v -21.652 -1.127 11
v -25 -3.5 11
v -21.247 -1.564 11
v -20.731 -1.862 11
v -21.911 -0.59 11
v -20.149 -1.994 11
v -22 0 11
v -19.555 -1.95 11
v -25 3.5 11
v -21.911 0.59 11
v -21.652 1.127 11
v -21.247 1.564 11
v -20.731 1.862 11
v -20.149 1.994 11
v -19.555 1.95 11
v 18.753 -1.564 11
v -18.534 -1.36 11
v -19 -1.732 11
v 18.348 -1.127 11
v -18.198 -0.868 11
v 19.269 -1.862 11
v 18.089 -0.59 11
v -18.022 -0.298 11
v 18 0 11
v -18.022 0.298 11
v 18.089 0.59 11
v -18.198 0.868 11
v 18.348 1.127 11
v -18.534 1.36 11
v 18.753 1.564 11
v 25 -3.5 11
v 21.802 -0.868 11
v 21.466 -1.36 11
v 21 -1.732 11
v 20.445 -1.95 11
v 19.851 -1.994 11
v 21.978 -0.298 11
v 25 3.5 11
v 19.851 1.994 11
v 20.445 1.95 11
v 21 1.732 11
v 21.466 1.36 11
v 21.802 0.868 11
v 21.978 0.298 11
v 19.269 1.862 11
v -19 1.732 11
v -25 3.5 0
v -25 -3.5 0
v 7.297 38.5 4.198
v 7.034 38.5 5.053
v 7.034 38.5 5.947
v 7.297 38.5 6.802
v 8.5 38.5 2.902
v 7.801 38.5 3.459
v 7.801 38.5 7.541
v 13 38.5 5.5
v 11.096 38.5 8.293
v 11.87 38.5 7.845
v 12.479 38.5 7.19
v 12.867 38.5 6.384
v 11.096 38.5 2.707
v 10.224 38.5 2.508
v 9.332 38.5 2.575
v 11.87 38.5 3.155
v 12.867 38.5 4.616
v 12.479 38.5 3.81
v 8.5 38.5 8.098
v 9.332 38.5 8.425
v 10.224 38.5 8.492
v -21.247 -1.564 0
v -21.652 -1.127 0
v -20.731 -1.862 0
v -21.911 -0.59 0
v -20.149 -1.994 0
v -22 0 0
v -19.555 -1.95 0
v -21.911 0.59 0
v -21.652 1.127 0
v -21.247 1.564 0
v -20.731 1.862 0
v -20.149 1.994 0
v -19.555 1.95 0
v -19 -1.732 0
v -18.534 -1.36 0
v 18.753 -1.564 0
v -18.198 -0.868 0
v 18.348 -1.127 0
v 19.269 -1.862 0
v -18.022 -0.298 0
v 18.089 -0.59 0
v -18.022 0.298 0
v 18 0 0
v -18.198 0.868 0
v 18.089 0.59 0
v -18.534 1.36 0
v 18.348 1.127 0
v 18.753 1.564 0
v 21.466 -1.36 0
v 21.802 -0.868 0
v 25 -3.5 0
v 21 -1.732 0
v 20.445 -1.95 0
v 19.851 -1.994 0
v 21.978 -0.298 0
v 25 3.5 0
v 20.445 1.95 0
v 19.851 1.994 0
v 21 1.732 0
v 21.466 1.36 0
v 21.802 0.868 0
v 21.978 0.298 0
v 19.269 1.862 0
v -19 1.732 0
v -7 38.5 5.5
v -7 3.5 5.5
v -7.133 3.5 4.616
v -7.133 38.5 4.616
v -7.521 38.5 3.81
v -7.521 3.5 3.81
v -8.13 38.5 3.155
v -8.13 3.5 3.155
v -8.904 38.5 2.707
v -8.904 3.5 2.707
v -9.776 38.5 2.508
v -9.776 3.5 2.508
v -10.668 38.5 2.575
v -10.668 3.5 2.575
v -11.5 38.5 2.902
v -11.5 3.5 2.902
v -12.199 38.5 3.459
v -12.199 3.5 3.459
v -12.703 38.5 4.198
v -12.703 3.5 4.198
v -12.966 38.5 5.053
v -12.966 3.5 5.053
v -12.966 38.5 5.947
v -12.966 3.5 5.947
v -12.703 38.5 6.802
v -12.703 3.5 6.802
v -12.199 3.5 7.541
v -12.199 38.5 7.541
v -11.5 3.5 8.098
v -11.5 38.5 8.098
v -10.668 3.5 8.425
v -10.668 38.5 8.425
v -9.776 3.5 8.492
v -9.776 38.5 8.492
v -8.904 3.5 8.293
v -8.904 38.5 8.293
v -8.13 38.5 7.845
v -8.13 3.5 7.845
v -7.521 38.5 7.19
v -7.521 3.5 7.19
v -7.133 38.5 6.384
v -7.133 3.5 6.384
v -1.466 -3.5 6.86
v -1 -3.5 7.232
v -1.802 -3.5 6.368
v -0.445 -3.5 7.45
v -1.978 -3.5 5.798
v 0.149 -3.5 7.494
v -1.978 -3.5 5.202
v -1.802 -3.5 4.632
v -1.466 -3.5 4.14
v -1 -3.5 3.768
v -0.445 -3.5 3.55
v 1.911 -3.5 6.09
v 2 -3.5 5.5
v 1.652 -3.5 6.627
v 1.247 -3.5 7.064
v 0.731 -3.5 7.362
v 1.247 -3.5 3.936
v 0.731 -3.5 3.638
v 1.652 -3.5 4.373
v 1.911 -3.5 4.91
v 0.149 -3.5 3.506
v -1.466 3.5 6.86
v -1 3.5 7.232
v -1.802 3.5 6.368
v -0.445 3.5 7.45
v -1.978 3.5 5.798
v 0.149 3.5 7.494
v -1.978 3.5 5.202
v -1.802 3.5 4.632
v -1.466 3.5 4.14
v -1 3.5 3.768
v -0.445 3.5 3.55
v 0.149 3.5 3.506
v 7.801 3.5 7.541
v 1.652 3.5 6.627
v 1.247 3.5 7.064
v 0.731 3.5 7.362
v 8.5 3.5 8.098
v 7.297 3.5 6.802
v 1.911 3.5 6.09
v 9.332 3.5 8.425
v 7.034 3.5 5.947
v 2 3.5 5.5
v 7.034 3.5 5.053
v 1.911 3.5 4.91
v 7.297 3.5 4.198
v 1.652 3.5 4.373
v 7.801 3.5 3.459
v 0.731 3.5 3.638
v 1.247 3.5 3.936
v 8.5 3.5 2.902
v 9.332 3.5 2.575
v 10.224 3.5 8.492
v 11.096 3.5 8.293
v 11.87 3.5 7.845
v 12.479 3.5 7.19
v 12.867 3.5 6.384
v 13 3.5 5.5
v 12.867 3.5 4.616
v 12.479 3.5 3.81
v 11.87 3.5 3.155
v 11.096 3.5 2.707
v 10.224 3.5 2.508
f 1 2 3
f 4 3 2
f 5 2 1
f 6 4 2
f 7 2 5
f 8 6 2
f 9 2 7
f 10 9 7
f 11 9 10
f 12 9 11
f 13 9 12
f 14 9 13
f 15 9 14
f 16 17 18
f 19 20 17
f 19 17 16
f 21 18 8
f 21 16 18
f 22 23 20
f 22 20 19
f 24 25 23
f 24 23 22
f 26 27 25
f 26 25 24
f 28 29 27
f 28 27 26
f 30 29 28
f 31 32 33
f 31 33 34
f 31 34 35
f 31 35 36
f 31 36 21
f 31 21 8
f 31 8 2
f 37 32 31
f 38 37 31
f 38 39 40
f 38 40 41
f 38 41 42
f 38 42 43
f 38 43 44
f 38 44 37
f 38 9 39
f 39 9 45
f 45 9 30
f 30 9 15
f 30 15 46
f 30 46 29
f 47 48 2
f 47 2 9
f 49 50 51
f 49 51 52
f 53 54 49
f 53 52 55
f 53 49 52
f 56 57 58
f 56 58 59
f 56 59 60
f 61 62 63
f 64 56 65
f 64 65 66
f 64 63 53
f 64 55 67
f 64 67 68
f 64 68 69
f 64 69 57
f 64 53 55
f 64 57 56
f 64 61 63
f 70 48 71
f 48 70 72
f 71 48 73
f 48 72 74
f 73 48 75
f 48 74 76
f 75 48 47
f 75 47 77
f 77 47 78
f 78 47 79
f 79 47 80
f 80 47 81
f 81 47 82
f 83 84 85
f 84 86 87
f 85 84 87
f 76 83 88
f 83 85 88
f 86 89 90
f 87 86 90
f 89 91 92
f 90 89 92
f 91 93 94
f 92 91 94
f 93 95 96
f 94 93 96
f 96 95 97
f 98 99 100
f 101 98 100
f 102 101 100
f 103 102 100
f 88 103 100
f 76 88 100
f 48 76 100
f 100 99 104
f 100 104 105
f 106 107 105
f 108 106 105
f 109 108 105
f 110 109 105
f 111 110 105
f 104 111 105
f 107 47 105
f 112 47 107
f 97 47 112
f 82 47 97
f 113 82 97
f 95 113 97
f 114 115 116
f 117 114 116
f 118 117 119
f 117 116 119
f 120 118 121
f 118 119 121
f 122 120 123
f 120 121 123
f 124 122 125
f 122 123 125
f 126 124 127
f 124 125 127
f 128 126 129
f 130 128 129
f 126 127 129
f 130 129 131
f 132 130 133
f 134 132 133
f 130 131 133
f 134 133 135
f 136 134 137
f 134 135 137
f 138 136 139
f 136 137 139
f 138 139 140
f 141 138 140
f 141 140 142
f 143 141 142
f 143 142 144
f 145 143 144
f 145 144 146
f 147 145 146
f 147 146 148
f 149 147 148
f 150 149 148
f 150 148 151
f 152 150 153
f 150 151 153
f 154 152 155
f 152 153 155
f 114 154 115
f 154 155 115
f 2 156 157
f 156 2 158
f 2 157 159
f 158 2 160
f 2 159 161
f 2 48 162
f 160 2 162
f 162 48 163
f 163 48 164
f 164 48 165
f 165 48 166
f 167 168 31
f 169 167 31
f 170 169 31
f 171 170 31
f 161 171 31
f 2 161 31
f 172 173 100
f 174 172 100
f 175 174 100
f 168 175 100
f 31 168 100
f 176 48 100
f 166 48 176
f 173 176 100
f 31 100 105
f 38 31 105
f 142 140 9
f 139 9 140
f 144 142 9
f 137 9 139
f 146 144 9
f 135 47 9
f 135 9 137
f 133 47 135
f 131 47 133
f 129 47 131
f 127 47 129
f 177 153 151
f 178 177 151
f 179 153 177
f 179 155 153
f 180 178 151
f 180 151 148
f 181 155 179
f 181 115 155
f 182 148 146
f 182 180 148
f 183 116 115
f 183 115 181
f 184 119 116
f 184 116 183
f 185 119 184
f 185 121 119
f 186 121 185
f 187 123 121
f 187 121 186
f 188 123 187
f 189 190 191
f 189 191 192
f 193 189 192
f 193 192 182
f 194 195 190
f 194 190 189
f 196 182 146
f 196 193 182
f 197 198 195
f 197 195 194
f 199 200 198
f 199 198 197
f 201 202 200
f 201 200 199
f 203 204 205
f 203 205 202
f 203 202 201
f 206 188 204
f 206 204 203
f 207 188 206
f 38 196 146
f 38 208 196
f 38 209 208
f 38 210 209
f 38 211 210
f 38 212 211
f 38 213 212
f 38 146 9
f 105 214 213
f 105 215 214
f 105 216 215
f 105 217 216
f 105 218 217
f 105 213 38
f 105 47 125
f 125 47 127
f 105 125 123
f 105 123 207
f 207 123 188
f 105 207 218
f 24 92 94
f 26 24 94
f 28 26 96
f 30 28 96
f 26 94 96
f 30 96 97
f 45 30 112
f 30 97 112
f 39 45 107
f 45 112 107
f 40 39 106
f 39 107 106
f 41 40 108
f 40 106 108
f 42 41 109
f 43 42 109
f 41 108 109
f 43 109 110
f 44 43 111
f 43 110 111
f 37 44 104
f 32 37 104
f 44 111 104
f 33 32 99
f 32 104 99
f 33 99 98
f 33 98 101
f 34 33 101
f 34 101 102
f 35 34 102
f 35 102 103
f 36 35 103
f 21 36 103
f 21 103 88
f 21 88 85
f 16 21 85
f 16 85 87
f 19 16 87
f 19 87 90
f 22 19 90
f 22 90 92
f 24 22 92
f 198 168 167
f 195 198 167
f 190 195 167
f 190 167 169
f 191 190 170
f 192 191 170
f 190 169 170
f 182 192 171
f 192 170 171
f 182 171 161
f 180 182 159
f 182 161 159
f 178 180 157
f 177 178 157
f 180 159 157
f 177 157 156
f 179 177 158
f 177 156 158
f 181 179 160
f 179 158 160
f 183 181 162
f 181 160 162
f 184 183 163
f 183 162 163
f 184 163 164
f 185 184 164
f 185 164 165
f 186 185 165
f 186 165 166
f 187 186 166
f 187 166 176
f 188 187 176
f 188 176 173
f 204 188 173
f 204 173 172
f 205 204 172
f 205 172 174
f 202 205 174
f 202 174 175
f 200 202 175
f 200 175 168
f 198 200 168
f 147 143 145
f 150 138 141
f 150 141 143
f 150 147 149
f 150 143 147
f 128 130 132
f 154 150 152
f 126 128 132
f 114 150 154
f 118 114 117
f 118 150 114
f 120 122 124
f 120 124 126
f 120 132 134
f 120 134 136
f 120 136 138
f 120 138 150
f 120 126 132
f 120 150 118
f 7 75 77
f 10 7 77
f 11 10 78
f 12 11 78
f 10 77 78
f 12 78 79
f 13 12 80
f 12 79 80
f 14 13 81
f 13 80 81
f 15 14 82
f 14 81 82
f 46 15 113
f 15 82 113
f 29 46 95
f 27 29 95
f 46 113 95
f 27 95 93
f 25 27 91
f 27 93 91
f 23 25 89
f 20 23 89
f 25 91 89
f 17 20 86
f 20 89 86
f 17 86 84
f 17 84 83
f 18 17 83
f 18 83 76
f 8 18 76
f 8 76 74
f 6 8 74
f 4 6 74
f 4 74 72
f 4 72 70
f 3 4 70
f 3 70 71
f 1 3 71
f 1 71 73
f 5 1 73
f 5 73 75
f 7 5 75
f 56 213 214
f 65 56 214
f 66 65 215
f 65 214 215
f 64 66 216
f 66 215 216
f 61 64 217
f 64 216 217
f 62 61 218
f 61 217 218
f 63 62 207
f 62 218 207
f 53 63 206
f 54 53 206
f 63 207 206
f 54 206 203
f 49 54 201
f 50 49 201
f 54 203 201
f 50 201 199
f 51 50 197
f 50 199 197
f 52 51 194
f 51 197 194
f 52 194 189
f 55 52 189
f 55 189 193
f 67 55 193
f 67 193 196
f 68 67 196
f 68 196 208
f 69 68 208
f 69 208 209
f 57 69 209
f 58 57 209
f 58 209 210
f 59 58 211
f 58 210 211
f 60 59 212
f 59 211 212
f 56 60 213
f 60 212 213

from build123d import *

# Parameters (mm, degrees)
SKETCH1_W           = 50
SKETCH1_H           = 7
BOSS_EXTRUDE1_DEPTH = 11
SKETCH2_R           = 2
CUT_EXTRUDE1_DEPTH  = 12
SKETCH3_R           = 2
CUT_EXTRUDE2_DEPTH  = 8
SKETCH4_R           = 3
BOSS_EXTRUDE2_DEPTH = 35


with BuildPart() as part:
    # Sketch1 → Boss-Extrude1 (new body)
    with BuildSketch(Plane.XY):
        Rectangle(SKETCH1_W, SKETCH1_H)
    extrude(amount=BOSS_EXTRUDE1_DEPTH)

    # Sketch2 → Cut-Extrude1 (cut, through all)
    with BuildSketch(Plane(origin=(0, 0, 0), x_dir=(-1, 0, 0), z_dir=(0, 0, -1))):
        with Locations((20, 0)):
            Circle(SKETCH2_R)
        with Locations((-20, 0)):
            Circle(SKETCH2_R)
    extrude(amount=-CUT_EXTRUDE1_DEPTH, mode=Mode.SUBTRACT)

    # Sketch3 → Cut-Extrude2 (cut, through all)
    with BuildSketch(Plane.XZ.offset(3.5)):
        with Locations((0, 5.5)):
            Circle(SKETCH3_R)
    extrude(amount=-CUT_EXTRUDE2_DEPTH, mode=Mode.SUBTRACT)

    # Sketch4 → Boss-Extrude2 (add)
    with BuildSketch(Plane(origin=(0, 3.5, 0), x_dir=(1, 0, 0), z_dir=(0, 1, 0))):
        with Locations((-10, -5.5)):
            Circle(SKETCH4_R)
        with Locations((10, -5.5)):
            Circle(SKETCH4_R)
    extrude(amount=BOSS_EXTRUDE2_DEPTH)


solid = part.part
